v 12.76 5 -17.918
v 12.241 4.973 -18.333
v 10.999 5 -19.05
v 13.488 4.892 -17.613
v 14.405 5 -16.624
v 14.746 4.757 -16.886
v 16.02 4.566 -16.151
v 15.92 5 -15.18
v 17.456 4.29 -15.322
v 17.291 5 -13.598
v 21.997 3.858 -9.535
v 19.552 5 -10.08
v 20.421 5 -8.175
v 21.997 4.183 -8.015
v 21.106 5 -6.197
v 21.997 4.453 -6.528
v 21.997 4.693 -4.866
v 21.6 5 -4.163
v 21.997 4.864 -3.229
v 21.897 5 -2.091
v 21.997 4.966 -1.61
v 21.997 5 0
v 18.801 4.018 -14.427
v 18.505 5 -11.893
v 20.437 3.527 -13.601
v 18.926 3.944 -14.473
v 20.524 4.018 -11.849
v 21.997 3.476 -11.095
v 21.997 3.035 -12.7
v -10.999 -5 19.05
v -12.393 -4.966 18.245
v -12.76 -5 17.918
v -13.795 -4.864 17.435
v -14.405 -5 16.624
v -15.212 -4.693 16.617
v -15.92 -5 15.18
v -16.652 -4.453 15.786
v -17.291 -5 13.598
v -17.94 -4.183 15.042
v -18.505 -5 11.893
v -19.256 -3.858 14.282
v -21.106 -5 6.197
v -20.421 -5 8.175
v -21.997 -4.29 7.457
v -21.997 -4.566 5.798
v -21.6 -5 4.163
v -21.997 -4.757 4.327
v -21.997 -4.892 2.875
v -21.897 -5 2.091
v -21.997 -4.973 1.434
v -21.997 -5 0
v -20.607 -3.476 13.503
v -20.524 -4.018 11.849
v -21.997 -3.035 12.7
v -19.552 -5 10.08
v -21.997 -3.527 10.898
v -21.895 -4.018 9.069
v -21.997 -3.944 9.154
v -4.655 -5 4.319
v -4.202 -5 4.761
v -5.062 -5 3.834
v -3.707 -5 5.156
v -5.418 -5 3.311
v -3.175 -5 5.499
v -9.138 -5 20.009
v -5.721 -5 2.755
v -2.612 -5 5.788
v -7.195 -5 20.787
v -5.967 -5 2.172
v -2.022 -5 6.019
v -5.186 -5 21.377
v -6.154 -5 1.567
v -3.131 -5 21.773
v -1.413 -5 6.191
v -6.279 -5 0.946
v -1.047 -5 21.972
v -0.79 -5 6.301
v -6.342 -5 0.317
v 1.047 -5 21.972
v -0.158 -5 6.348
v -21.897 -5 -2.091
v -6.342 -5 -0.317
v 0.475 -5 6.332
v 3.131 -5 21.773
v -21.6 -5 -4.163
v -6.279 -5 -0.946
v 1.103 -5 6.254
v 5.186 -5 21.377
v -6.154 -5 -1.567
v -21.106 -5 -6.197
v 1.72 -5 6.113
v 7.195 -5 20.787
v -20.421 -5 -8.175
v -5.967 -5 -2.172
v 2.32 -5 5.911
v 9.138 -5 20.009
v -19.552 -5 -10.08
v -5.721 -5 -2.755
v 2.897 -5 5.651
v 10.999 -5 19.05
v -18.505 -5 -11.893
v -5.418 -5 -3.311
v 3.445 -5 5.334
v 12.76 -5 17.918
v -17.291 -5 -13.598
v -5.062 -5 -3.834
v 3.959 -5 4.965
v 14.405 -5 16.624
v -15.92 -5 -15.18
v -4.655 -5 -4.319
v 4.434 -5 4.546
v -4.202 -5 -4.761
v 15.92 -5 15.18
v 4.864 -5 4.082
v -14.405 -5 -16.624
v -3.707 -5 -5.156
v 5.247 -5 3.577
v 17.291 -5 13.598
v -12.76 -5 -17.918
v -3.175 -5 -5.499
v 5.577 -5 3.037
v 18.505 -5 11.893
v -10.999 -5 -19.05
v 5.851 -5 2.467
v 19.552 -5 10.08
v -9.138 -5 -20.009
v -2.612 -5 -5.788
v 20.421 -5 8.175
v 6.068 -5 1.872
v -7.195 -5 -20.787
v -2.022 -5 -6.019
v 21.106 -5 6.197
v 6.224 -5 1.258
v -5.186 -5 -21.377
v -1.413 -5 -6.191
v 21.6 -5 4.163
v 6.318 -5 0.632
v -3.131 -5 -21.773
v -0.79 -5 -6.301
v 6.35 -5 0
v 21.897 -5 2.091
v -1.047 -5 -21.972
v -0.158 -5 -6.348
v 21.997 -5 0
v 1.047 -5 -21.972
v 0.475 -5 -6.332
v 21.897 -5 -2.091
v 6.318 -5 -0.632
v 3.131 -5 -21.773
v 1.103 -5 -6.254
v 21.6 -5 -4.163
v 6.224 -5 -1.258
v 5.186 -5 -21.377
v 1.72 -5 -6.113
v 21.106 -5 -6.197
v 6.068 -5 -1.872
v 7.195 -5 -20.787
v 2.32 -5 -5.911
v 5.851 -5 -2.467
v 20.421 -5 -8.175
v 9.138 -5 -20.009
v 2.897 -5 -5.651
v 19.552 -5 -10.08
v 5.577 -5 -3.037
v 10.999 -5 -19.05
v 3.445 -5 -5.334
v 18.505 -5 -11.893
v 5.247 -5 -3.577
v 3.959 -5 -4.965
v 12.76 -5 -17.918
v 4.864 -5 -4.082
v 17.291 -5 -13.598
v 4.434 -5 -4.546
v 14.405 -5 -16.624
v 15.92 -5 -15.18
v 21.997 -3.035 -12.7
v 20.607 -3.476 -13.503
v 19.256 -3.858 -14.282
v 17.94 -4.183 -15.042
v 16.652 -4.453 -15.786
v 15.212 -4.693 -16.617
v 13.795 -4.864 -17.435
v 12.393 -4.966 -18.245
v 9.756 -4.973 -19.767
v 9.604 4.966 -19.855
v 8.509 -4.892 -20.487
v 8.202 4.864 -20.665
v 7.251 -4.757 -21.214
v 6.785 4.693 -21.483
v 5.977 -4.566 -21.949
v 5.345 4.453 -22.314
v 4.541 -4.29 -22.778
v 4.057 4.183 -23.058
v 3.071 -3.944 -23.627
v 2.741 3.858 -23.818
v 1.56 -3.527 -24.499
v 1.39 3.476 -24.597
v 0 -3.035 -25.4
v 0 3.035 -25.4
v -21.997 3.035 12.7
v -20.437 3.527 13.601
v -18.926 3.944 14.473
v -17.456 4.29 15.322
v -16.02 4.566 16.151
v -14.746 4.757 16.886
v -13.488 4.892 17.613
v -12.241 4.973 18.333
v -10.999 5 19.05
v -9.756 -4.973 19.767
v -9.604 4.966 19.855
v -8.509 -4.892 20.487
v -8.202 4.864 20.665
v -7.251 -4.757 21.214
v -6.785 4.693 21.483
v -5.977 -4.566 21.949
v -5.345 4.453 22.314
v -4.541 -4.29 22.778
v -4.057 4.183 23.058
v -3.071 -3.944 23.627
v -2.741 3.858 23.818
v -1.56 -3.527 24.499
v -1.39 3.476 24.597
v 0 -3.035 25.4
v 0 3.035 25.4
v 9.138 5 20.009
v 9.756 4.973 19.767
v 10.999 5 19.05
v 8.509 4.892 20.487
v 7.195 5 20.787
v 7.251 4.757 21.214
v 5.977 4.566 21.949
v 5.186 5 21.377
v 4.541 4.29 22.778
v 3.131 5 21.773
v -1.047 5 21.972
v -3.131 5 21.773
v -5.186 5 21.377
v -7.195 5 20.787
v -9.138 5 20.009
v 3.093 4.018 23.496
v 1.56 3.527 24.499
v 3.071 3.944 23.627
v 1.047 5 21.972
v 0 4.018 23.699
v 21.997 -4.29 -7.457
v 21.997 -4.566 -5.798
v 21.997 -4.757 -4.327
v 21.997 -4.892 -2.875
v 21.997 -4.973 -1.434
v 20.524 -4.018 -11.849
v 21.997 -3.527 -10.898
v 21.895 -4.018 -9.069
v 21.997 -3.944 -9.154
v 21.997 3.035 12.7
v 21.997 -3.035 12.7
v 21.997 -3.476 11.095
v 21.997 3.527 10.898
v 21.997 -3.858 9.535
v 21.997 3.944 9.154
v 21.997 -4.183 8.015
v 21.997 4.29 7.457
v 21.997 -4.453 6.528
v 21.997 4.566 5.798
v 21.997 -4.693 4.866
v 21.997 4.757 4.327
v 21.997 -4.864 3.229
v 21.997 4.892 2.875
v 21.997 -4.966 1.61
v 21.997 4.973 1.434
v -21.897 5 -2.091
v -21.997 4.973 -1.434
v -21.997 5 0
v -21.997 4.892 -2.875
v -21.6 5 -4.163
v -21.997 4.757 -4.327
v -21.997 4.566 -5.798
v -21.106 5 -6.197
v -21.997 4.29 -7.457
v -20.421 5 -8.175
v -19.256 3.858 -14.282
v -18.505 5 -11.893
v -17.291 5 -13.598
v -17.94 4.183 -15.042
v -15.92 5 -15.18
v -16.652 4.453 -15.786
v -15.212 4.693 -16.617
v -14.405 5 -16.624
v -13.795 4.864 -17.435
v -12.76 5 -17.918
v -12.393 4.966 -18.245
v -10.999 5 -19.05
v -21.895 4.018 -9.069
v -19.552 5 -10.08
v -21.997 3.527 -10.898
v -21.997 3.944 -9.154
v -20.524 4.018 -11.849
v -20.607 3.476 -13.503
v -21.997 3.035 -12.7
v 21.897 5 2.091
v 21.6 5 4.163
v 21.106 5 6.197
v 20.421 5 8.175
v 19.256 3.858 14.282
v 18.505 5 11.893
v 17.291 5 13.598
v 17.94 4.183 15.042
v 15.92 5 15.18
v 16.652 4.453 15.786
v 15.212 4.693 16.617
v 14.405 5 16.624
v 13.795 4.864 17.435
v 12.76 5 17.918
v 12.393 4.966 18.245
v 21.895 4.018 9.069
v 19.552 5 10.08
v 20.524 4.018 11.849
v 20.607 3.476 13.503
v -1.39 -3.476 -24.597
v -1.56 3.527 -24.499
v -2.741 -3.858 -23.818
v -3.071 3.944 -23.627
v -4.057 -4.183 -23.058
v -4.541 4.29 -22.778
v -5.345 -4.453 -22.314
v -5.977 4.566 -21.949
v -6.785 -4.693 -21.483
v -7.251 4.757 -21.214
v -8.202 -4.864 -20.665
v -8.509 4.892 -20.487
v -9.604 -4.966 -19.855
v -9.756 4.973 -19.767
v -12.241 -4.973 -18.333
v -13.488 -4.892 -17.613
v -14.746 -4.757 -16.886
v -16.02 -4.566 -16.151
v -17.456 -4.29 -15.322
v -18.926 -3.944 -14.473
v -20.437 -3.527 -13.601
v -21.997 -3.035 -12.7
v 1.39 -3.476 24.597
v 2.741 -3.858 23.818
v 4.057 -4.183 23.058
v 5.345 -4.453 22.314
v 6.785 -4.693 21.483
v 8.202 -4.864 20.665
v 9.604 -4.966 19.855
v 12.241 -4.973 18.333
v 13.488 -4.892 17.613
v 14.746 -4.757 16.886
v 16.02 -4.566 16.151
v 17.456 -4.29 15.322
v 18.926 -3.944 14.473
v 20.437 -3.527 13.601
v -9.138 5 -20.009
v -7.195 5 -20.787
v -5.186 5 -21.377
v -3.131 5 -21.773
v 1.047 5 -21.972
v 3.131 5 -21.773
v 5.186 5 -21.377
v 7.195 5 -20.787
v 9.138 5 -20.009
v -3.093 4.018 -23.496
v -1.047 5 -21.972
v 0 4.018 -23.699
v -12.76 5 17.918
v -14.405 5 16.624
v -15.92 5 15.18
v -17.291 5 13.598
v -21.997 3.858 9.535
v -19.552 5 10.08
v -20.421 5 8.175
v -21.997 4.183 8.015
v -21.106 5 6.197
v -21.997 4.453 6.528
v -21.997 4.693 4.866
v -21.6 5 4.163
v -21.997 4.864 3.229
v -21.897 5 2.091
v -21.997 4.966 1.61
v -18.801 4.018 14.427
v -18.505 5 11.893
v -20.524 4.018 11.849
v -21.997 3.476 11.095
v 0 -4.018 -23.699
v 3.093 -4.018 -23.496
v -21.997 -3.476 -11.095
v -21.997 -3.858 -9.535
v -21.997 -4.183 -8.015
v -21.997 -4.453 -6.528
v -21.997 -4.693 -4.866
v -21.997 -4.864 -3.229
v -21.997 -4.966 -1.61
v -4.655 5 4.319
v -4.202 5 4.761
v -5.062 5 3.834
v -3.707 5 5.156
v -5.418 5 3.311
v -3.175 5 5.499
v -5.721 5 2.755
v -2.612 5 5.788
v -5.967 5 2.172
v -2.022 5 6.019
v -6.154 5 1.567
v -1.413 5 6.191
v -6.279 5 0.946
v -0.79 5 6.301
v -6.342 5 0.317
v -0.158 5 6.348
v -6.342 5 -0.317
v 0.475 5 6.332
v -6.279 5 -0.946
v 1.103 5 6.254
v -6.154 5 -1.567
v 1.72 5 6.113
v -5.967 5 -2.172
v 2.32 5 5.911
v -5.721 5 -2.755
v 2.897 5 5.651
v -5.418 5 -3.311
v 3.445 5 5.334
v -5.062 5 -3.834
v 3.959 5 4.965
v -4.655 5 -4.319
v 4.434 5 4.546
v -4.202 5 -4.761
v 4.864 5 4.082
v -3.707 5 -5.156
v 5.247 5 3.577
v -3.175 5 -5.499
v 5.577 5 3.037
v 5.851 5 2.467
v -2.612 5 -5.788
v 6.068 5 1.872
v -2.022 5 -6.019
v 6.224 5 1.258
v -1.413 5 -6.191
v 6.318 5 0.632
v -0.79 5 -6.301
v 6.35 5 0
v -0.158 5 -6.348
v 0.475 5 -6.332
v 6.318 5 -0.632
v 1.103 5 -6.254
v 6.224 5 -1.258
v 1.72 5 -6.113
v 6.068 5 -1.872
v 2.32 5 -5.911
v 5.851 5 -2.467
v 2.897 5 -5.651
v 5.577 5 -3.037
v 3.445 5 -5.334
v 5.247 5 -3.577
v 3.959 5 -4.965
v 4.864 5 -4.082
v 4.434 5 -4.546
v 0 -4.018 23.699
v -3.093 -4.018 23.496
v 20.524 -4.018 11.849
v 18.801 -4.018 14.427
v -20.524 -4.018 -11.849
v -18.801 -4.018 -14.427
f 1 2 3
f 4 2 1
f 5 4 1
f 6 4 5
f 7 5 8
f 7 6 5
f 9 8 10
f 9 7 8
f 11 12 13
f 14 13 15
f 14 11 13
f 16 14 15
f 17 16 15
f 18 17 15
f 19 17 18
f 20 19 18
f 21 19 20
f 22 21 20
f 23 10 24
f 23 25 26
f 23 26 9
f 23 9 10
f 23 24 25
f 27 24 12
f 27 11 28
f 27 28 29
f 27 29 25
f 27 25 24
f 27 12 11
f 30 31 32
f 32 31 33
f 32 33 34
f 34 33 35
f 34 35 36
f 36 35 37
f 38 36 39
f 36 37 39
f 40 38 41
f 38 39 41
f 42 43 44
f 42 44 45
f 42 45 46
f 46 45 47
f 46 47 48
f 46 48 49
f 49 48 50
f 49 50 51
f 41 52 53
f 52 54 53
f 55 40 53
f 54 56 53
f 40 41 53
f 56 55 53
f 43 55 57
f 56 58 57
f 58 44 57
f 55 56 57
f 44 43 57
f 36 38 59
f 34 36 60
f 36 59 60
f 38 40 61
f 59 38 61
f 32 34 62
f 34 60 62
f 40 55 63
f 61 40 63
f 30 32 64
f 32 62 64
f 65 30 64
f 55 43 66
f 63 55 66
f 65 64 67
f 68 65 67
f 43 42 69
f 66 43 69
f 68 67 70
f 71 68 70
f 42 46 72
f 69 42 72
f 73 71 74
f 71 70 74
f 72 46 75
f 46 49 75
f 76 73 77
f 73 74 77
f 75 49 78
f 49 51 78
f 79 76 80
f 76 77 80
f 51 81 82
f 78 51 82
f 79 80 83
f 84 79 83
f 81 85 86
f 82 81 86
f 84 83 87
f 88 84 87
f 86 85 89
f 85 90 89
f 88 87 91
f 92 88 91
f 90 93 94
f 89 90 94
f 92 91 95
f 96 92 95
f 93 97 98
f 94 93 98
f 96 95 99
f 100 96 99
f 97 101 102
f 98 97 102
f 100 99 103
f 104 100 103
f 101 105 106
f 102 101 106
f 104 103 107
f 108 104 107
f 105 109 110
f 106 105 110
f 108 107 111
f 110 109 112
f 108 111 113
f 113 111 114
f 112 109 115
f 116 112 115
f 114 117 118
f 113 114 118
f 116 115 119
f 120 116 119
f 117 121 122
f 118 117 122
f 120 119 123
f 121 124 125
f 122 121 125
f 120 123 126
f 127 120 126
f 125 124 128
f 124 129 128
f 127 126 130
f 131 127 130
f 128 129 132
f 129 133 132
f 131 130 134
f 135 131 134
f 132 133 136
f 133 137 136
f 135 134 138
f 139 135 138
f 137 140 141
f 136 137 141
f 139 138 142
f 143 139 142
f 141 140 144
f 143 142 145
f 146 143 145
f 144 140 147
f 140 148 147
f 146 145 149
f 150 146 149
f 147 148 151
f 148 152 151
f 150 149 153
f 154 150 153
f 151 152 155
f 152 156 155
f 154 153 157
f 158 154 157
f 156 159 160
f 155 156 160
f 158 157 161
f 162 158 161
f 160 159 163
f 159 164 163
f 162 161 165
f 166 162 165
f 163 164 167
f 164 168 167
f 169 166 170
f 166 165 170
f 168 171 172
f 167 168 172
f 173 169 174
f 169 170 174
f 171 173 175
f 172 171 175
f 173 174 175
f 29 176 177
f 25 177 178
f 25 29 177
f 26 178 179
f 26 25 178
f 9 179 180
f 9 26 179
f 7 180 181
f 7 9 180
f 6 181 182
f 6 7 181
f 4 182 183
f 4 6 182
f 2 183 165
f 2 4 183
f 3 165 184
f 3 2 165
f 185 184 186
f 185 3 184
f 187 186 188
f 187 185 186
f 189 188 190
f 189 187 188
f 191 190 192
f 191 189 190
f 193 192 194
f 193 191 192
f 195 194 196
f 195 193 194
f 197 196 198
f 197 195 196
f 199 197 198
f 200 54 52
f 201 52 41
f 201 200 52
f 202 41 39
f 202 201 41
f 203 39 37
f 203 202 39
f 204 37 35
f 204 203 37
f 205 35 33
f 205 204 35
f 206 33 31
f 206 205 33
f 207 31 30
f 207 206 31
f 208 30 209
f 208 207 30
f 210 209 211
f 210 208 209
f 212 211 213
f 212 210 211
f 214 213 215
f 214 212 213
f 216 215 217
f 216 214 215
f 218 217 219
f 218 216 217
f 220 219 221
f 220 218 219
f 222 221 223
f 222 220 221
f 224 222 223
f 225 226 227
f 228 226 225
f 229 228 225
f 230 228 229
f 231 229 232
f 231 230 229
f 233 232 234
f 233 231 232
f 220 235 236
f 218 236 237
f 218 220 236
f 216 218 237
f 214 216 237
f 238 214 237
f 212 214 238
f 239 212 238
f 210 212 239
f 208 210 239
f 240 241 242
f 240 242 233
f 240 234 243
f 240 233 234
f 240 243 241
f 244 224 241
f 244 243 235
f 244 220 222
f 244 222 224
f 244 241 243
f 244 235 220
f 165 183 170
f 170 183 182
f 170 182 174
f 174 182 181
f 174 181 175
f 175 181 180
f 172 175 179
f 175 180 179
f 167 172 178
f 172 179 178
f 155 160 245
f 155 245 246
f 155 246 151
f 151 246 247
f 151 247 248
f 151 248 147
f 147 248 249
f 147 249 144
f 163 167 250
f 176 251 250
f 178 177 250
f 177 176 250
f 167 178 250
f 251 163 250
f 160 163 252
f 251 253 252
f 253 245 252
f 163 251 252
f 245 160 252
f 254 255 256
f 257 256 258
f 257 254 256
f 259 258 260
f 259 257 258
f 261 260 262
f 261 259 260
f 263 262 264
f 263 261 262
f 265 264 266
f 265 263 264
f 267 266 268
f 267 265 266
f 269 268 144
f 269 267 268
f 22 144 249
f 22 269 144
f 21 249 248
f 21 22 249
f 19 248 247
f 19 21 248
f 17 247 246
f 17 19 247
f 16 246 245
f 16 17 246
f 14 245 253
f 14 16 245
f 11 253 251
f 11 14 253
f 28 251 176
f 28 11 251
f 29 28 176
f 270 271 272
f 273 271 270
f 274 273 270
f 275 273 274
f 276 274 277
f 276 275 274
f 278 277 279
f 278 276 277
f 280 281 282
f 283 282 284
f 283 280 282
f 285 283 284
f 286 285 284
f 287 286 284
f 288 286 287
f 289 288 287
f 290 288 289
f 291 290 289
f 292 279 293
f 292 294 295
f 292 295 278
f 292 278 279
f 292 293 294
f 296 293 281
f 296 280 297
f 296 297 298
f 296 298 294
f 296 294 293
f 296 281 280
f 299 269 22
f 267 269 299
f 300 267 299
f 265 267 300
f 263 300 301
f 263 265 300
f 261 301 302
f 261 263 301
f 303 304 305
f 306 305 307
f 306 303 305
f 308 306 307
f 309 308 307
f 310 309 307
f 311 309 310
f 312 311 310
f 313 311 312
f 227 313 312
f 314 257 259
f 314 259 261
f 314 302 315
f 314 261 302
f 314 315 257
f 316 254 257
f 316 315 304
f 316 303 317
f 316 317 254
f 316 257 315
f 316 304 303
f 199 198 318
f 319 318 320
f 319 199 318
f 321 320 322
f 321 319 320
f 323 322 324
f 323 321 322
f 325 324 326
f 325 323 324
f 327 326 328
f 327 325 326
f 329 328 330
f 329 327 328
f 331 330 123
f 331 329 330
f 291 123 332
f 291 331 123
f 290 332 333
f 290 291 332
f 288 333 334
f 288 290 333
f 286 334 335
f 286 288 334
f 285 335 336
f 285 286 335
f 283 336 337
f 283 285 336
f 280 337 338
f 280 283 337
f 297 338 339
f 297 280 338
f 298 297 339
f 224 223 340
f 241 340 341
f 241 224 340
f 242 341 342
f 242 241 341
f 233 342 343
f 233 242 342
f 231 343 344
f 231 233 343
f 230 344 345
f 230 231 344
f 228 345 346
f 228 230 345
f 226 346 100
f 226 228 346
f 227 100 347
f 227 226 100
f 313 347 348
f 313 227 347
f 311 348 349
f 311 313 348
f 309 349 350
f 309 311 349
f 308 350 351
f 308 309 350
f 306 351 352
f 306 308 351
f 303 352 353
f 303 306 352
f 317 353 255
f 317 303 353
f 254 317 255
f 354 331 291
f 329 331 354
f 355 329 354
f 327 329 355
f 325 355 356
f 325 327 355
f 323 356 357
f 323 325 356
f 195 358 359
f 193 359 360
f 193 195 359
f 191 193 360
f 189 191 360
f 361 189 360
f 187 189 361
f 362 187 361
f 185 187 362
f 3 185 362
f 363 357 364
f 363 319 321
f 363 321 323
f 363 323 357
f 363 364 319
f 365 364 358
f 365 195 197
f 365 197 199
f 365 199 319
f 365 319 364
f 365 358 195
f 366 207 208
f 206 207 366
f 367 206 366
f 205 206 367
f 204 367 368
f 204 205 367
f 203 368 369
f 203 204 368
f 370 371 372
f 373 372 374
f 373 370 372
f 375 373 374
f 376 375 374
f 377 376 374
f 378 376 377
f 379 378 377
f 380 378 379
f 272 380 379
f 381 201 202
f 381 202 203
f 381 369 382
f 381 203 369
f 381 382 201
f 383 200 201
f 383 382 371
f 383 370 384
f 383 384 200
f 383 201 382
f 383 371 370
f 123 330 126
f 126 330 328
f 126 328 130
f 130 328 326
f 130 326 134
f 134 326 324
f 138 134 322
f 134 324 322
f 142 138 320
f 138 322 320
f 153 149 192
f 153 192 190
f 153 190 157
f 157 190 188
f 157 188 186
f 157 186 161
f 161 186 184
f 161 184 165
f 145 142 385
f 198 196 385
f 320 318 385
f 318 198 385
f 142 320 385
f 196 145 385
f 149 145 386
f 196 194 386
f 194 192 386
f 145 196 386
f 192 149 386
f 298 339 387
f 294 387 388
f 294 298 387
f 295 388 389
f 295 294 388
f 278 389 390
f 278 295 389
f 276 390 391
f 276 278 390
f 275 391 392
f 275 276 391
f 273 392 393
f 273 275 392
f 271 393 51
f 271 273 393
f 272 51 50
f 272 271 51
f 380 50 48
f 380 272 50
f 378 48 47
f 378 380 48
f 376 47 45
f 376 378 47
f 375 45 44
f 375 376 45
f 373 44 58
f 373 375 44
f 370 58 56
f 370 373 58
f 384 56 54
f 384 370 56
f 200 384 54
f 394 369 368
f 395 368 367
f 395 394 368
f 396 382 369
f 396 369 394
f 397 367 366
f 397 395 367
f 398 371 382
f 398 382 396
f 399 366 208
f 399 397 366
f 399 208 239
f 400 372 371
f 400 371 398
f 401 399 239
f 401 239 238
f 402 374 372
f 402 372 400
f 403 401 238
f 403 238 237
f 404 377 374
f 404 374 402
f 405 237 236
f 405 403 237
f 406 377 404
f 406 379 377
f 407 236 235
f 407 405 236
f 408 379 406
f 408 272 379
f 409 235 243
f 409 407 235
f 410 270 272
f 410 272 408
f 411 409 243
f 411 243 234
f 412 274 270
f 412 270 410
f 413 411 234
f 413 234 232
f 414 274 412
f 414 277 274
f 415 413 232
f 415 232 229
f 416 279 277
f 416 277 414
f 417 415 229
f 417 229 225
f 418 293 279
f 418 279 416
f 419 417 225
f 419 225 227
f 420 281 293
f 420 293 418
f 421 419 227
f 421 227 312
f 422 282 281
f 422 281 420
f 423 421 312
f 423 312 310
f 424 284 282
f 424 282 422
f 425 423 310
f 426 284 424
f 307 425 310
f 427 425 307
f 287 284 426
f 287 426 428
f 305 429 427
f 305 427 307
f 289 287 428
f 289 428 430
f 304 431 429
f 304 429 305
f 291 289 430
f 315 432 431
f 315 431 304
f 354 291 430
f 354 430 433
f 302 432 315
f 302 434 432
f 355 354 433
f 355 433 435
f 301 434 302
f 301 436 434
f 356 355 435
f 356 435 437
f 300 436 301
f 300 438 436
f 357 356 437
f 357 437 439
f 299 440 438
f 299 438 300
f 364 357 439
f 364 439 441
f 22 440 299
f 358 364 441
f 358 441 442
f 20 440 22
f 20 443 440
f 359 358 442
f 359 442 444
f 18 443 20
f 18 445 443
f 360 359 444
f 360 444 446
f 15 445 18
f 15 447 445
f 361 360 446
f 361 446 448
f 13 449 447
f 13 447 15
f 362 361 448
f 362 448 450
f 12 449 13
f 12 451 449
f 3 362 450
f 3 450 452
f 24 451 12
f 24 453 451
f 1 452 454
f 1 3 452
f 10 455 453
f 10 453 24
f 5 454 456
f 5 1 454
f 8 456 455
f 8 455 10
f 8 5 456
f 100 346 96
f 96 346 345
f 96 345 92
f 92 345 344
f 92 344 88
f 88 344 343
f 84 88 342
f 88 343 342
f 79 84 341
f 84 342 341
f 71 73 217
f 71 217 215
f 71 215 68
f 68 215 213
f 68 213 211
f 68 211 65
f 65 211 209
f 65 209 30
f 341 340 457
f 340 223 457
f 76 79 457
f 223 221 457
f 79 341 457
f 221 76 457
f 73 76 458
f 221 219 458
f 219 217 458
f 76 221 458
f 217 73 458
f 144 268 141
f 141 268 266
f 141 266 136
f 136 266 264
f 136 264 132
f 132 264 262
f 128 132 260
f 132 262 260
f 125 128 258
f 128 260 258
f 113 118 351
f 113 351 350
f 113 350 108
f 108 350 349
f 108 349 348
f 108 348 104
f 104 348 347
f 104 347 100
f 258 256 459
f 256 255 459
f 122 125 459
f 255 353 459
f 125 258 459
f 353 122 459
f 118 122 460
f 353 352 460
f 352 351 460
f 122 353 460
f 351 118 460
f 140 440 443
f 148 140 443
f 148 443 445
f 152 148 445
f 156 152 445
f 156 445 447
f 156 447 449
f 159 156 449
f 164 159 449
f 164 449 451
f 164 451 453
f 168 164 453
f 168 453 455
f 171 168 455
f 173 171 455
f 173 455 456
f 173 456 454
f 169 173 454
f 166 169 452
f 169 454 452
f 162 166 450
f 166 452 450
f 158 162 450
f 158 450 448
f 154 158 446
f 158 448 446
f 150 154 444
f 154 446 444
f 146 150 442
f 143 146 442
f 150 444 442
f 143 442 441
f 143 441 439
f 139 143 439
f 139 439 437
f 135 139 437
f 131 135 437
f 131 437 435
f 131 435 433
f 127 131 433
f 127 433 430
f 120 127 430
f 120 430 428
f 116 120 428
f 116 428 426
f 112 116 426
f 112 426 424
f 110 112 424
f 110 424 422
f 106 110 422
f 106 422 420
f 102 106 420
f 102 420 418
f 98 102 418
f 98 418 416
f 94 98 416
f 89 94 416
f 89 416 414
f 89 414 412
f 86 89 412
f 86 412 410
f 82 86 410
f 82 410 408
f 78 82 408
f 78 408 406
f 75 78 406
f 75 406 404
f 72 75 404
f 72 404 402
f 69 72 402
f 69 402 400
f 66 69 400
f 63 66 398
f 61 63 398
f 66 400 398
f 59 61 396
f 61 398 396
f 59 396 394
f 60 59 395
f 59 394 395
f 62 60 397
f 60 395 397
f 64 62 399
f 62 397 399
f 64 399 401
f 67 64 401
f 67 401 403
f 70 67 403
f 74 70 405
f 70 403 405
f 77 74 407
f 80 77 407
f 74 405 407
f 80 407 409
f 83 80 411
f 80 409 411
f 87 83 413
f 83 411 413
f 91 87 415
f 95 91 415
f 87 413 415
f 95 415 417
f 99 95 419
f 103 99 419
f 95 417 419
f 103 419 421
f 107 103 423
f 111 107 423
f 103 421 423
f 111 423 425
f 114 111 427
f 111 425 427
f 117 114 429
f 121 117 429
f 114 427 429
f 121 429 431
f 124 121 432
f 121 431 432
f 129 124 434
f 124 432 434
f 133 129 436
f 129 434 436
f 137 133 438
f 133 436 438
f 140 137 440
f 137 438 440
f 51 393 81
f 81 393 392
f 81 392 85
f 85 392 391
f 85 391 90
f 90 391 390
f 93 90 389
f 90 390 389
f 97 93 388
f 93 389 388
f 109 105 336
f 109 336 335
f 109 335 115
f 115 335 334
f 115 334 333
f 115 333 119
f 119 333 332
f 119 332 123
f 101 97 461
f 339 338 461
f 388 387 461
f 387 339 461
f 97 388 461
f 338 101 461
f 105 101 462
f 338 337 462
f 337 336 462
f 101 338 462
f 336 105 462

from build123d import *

# Parameters (mm, degrees)
BOSS_EXTRUDE1_DEPTH = 5
SKETCH2_R           = 6.35
CUT_EXTRUDE1_DEPTH  = 11
SKETCH3_OUTSIDE_W   = 97.688
SKETCH3_OUTSIDE_H   = 104.494
SKETCH3_OUTSIDE_R   = 21.997045256
CUT_EXTRUDE2_DEPTH  = 11
CUT_EXTRUDE2_TAPER  = 60


with BuildPart() as part:
    # Sketch1 → Boss-Extrude1 (new body, symmetric)
    with BuildSketch(Plane(origin=(0, 0, 0), x_dir=(1, 0, 0), z_dir=(0, 1, 0))):
        Polygon((21.997045256, 12.7), (0, 25.4), (-21.997045256, 12.7), (-21.997045256, -12.7), (0, -25.4), (21.997045256, -12.7), align=None)
    extrude(amount=BOSS_EXTRUDE1_DEPTH, both=True)

    # Sketch2 → Cut-Extrude1 (cut, through all)
    with BuildSketch(Plane(origin=(0, 5, 0), x_dir=(1, 0, 0), z_dir=(0, 1, 0))):
        Circle(SKETCH2_R)
    extrude(amount=-CUT_EXTRUDE1_DEPTH, mode=Mode.SUBTRACT)

    # Sketch3 outside → Cut-Extrude2 (cut, through all)
    with BuildSketch(Plane(origin=(0, 5, 0), x_dir=(1, 0, 0), z_dir=(0, 1, 0))):
        Rectangle(SKETCH3_OUTSIDE_W, SKETCH3_OUTSIDE_H)
        Circle(SKETCH3_OUTSIDE_R, mode=Mode.SUBTRACT)
    cut_extrude2 = extrude(amount=-CUT_EXTRUDE2_DEPTH, taper=CUT_EXTRUDE2_TAPER, mode=Mode.SUBTRACT)

    # Mirror1: Cut-Extrude2 across plane
    add(cut_extrude2.mirror(Plane.ZX), mode=Mode.SUBTRACT)


solid = part.part
